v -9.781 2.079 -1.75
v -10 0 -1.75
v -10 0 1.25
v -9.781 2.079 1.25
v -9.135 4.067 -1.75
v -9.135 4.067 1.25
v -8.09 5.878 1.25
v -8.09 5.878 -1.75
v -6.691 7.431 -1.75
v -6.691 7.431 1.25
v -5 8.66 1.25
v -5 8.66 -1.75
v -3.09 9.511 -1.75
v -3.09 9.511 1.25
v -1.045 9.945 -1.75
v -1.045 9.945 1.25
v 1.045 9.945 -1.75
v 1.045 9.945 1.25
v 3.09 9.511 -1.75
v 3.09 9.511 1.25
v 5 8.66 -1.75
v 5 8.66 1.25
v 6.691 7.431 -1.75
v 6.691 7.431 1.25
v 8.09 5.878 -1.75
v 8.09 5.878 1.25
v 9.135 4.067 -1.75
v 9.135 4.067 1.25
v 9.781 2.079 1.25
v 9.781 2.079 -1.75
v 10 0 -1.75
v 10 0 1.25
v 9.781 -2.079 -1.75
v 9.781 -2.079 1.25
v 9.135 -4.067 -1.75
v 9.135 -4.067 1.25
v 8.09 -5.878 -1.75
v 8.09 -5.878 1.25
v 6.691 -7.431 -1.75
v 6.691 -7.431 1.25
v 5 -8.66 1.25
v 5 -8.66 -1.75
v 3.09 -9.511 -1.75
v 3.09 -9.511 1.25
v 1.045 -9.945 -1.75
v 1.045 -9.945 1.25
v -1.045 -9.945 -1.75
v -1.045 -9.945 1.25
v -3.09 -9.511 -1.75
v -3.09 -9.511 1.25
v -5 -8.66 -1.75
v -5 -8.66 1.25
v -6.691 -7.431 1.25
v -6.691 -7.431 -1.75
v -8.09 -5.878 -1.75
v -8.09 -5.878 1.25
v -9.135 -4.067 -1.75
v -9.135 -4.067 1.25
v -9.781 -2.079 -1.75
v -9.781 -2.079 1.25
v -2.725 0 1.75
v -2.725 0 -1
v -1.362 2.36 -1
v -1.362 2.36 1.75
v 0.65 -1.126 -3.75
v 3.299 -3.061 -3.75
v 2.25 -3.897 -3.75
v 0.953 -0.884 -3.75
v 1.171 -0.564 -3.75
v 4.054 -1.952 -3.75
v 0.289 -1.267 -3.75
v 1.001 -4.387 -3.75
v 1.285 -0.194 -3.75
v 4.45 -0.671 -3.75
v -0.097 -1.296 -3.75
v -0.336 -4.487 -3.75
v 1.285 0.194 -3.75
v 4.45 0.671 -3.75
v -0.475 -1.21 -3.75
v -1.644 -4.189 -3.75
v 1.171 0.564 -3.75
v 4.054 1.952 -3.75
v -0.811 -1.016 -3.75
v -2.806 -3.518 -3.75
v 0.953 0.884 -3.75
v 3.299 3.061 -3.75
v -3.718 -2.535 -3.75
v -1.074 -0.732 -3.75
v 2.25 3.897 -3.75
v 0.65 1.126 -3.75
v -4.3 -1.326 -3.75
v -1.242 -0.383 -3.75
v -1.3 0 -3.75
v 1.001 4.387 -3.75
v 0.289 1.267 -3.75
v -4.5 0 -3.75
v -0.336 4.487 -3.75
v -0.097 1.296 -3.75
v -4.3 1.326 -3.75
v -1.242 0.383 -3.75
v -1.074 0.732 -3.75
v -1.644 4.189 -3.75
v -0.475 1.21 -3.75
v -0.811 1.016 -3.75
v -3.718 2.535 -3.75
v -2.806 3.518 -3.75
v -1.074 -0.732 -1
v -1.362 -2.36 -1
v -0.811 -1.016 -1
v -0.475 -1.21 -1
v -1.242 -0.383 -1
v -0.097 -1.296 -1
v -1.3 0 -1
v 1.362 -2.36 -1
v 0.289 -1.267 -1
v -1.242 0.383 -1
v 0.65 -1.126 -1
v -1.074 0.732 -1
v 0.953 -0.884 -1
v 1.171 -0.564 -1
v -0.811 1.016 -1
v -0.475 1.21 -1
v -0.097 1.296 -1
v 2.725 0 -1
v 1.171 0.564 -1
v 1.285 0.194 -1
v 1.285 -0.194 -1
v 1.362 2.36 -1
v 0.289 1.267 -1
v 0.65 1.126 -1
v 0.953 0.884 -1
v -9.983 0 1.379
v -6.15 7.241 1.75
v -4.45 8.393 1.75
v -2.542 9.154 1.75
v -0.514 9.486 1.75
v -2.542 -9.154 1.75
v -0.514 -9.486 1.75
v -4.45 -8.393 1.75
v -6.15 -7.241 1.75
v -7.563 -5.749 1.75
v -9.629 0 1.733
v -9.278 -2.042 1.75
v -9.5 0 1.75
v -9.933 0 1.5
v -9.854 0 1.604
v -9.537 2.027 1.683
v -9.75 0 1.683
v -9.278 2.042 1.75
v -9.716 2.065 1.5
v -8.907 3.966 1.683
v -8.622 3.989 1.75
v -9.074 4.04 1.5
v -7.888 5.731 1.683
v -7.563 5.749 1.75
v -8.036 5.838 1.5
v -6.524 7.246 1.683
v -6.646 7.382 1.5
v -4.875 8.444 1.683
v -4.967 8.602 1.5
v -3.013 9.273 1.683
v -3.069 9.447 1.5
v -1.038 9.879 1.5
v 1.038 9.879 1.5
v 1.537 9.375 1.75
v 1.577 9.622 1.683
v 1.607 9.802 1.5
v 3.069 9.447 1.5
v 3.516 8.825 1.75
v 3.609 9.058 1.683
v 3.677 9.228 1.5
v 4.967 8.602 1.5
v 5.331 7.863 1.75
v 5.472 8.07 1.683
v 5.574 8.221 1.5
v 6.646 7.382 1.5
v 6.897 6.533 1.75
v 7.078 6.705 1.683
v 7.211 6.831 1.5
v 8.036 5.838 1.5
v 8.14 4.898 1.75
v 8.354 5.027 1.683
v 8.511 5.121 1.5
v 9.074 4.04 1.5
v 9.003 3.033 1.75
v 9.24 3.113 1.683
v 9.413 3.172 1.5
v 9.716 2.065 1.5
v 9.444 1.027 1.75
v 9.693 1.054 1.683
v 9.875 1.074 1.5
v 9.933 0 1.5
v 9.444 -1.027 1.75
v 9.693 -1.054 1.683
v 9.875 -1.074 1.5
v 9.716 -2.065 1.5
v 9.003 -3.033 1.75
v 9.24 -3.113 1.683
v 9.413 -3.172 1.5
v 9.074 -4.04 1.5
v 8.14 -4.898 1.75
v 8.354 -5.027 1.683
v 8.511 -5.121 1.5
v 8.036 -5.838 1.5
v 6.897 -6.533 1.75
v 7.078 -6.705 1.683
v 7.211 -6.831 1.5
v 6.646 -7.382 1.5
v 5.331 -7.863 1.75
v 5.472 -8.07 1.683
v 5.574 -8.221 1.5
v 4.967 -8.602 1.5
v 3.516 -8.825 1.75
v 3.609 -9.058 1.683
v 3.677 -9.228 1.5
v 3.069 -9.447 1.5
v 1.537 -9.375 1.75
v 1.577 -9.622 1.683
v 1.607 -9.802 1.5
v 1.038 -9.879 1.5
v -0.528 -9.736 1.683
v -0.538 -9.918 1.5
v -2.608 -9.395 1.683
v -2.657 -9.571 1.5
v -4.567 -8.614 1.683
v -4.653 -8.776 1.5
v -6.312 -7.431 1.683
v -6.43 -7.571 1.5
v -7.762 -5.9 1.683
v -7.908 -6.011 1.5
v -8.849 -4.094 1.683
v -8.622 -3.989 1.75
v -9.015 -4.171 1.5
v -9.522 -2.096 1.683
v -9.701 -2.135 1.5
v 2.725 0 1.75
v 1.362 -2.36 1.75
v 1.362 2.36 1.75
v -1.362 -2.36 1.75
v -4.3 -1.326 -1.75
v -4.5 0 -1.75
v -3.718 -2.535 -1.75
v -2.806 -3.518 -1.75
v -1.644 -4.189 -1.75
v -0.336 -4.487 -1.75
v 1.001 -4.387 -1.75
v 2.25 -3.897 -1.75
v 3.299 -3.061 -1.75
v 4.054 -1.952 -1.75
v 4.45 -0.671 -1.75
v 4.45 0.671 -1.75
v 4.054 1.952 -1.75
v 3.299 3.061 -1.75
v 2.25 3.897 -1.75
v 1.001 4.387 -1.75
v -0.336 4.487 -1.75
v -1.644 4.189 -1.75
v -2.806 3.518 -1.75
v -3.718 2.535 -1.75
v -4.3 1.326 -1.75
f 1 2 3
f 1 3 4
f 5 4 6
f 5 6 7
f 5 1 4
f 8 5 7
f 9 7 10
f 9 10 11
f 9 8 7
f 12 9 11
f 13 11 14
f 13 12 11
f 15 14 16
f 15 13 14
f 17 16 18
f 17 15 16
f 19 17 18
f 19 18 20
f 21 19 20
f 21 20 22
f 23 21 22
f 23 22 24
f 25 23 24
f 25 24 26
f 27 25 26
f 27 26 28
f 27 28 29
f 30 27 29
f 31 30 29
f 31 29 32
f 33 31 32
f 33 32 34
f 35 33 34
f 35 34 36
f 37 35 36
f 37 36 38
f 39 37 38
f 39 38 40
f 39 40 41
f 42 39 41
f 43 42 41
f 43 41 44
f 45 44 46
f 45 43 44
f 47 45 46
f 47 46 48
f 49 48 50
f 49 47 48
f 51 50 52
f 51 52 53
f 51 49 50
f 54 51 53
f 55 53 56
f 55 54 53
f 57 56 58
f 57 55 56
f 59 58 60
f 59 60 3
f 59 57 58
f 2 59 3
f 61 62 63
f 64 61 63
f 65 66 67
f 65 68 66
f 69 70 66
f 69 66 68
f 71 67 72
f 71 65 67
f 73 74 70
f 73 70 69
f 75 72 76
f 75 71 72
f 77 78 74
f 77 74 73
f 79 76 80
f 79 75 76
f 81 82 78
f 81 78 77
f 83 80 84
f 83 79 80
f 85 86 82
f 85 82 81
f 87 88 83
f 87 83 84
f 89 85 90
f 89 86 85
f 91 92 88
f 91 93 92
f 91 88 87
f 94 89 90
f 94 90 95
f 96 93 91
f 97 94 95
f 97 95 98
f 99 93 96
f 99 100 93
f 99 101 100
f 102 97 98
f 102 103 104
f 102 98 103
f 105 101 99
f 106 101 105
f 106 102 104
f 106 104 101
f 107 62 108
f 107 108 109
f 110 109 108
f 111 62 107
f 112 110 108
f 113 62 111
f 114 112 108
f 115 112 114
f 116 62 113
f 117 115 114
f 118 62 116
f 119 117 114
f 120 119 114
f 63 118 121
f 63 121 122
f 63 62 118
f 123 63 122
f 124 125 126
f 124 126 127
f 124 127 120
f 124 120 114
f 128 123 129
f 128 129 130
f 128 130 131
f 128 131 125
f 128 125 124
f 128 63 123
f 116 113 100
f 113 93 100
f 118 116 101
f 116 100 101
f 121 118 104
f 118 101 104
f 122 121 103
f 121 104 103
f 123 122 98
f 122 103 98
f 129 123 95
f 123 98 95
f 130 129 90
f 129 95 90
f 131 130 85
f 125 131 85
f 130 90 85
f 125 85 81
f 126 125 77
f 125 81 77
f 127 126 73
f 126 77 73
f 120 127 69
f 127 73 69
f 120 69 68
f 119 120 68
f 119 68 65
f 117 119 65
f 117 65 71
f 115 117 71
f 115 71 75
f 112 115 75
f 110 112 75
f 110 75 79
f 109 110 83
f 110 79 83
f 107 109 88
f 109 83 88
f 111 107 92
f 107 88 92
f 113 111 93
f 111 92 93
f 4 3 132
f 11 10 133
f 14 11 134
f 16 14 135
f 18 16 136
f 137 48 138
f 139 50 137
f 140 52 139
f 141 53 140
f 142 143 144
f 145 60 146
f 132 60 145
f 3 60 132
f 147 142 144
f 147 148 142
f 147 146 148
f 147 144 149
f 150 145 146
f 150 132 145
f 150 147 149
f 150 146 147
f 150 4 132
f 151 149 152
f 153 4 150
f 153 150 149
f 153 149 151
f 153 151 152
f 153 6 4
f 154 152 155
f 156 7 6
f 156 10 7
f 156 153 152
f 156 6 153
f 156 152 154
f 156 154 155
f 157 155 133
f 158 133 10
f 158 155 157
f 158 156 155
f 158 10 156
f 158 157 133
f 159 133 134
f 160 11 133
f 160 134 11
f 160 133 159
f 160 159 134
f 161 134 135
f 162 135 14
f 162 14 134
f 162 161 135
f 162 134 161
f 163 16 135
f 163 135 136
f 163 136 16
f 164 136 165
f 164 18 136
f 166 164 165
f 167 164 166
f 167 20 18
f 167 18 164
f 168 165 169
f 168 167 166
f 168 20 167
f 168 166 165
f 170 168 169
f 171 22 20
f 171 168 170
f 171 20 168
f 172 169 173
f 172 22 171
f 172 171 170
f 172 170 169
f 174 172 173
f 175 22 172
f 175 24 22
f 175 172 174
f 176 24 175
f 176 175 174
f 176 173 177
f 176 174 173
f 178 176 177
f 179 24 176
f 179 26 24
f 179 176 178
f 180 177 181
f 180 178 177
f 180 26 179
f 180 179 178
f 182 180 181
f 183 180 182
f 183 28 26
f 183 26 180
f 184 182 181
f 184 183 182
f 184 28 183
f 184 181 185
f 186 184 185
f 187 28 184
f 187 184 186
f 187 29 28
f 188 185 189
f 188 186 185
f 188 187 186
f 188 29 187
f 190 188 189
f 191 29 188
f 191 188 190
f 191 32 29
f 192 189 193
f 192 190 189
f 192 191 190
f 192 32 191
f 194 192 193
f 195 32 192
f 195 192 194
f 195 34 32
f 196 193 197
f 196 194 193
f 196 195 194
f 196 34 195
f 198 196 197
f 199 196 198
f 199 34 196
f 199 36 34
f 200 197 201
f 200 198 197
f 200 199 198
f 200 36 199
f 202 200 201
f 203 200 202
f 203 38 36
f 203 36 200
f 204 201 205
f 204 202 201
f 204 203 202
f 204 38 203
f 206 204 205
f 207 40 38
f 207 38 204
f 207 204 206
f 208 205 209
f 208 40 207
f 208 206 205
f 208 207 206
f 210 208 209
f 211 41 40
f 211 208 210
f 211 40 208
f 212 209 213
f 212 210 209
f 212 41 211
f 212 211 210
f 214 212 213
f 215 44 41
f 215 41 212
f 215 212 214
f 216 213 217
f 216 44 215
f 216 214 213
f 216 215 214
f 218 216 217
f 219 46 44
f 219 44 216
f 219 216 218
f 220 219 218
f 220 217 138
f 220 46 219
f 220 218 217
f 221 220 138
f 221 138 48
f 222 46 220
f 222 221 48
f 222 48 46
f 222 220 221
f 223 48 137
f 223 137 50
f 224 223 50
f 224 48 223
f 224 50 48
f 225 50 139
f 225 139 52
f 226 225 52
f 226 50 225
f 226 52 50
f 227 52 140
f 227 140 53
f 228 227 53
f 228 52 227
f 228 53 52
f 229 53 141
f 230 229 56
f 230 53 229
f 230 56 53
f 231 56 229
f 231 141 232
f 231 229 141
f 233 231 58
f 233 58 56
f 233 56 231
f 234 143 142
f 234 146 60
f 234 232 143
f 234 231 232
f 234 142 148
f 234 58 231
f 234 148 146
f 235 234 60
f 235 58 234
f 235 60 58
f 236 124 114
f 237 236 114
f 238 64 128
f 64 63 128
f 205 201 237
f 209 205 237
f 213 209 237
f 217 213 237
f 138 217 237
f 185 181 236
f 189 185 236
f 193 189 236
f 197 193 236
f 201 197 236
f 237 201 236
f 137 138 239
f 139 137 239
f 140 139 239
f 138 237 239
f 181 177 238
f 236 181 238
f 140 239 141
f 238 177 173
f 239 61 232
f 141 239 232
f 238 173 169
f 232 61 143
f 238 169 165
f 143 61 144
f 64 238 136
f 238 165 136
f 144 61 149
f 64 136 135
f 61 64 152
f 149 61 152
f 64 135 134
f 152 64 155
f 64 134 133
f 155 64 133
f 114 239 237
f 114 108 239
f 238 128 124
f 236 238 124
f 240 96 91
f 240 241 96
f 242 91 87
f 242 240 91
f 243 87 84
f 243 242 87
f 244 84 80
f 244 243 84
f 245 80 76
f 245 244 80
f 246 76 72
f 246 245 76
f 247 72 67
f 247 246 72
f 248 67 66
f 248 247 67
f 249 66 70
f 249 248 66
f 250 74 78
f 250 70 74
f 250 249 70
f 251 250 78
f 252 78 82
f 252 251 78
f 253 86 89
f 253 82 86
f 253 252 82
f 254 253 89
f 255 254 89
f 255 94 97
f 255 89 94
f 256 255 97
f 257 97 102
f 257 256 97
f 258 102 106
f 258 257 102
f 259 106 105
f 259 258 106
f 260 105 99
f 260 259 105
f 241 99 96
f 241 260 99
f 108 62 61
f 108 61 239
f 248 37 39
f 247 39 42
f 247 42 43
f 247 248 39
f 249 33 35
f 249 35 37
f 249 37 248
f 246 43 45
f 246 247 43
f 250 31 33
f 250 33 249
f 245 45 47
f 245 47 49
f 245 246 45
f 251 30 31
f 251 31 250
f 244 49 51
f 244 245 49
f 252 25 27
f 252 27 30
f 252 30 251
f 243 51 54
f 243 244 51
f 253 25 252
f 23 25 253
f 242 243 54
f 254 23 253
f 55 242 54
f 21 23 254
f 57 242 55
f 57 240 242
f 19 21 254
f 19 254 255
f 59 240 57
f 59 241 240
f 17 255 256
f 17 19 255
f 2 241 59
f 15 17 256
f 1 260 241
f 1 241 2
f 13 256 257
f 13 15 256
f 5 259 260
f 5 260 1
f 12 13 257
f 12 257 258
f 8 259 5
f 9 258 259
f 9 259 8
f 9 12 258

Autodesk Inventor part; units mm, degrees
ref_plane "YZ Plane" through (0, 0, 0) normal (1, 0, 0) x (0, 1, 0)
ref_plane "XZ Plane" through (0, 0, 0) normal (0, 1, 0) x (-1, 0, 0)
sketch "Эскиз1" plane through (0, 0, 0) normal (0, 1, 0) x (-1, 0, 0)
  line L0 (-10, 1.75) -> (10, 1.75)
  line L1 (10, 1.75) -> (10, -1.75)
  line L2 (10, -1.75) -> (-10, -1.75)
  line L3 (-10, -1.75) -> (-10, 1.75)
  line L4 (-10, 1.75) -> (10, -1.75) construction
  line L5 (10, 1.75) -> (-10, -1.75) construction
  line L6 (2.5, -1.75) -> (-2.5, -1.75)
  line L7 (-2.5, -1.75) -> (-2.5, -3.75)
  line L8 (-2.5, -3.75) -> (2.5, -3.75)
  line L9 (2.5, -3.75) -> (2.5, -1.75)
  line L10 (0, 1.75) -> (0, -1.75)
  point P0 (0, 0)
  dimension "d0" = 20
  dimension "d1" = 3.5
  dimension "d2" = 5
  dimension "d3" = 2
revolve "Вращение1" add sketch "Эскиз1" angle 360 about axis through (0, 0, 1.75) along (0, 0, -1) contours L0 L1 L2 L10
ref_plane "РабПлоскость2" through (-7.5, 5, 1.5) normal (0, 0, 1) x (1, 0, 0)
sketch "Эскиз3" plane through (-7.5, 5, 1.5) normal (0, 0, 1) x (1, 0, 0)
  circle A0 centre (7.5, -5) radius 2.725 construction
  line L0 (7.5, -5) -> (8.8625, -2.6401) construction
  line L1 (7.5, -5) -> (6.1375, -2.6401) construction
  line L2 (7.5, -5) -> (4.775, -5) construction
  line L3 (7.5, -5) -> (6.1375, -7.3599) construction
  line L4 (7.5, -5) -> (8.8625, -7.3599) construction
  line L5 (7.5, -5) -> (10.225, -5) construction
  line L6 (6.1375, -2.6401) -> (8.8625, -2.6401)
  line L7 (8.8625, -2.6401) -> (10.225, -5)
  line L8 (10.225, -5) -> (8.8625, -7.3599)
  line L9 (6.1375, -7.3599) -> (8.8625, -7.3599)
  line L10 (4.775, -5) -> (6.1375, -7.3599)
  line L11 (4.775, -5) -> (6.1375, -2.6401)
  dimension "d12" = 5.45
  dimension "d15" = 360
extrude "Выдавливание4" cut sketch "Эскиз3" along normal blind 2.5 and the other way blind 2.5
sketch "Эскиз4" plane through (0, 0, -1.75) normal (0, 0, -1) x (-1, 0, 0)
  circle A0 centre (0, 0) radius 1.3
  circle A1 centre (0, 0) radius 4.5
  point P0 (0, 0)
  dimension "d20" = 2.6
  dimension "d21" = 9
extrude "Выдавливание5" add sketch "Эскиз4" along normal blind 2
extrude "Выдавливание6" cut sketch "Эскиз4" against normal mid plane 12 contours A0
fillet "Сопряжение1" radius 0.5 1 edges at (10, 0, 1.75)
properties part number "kikcer_head_002"
